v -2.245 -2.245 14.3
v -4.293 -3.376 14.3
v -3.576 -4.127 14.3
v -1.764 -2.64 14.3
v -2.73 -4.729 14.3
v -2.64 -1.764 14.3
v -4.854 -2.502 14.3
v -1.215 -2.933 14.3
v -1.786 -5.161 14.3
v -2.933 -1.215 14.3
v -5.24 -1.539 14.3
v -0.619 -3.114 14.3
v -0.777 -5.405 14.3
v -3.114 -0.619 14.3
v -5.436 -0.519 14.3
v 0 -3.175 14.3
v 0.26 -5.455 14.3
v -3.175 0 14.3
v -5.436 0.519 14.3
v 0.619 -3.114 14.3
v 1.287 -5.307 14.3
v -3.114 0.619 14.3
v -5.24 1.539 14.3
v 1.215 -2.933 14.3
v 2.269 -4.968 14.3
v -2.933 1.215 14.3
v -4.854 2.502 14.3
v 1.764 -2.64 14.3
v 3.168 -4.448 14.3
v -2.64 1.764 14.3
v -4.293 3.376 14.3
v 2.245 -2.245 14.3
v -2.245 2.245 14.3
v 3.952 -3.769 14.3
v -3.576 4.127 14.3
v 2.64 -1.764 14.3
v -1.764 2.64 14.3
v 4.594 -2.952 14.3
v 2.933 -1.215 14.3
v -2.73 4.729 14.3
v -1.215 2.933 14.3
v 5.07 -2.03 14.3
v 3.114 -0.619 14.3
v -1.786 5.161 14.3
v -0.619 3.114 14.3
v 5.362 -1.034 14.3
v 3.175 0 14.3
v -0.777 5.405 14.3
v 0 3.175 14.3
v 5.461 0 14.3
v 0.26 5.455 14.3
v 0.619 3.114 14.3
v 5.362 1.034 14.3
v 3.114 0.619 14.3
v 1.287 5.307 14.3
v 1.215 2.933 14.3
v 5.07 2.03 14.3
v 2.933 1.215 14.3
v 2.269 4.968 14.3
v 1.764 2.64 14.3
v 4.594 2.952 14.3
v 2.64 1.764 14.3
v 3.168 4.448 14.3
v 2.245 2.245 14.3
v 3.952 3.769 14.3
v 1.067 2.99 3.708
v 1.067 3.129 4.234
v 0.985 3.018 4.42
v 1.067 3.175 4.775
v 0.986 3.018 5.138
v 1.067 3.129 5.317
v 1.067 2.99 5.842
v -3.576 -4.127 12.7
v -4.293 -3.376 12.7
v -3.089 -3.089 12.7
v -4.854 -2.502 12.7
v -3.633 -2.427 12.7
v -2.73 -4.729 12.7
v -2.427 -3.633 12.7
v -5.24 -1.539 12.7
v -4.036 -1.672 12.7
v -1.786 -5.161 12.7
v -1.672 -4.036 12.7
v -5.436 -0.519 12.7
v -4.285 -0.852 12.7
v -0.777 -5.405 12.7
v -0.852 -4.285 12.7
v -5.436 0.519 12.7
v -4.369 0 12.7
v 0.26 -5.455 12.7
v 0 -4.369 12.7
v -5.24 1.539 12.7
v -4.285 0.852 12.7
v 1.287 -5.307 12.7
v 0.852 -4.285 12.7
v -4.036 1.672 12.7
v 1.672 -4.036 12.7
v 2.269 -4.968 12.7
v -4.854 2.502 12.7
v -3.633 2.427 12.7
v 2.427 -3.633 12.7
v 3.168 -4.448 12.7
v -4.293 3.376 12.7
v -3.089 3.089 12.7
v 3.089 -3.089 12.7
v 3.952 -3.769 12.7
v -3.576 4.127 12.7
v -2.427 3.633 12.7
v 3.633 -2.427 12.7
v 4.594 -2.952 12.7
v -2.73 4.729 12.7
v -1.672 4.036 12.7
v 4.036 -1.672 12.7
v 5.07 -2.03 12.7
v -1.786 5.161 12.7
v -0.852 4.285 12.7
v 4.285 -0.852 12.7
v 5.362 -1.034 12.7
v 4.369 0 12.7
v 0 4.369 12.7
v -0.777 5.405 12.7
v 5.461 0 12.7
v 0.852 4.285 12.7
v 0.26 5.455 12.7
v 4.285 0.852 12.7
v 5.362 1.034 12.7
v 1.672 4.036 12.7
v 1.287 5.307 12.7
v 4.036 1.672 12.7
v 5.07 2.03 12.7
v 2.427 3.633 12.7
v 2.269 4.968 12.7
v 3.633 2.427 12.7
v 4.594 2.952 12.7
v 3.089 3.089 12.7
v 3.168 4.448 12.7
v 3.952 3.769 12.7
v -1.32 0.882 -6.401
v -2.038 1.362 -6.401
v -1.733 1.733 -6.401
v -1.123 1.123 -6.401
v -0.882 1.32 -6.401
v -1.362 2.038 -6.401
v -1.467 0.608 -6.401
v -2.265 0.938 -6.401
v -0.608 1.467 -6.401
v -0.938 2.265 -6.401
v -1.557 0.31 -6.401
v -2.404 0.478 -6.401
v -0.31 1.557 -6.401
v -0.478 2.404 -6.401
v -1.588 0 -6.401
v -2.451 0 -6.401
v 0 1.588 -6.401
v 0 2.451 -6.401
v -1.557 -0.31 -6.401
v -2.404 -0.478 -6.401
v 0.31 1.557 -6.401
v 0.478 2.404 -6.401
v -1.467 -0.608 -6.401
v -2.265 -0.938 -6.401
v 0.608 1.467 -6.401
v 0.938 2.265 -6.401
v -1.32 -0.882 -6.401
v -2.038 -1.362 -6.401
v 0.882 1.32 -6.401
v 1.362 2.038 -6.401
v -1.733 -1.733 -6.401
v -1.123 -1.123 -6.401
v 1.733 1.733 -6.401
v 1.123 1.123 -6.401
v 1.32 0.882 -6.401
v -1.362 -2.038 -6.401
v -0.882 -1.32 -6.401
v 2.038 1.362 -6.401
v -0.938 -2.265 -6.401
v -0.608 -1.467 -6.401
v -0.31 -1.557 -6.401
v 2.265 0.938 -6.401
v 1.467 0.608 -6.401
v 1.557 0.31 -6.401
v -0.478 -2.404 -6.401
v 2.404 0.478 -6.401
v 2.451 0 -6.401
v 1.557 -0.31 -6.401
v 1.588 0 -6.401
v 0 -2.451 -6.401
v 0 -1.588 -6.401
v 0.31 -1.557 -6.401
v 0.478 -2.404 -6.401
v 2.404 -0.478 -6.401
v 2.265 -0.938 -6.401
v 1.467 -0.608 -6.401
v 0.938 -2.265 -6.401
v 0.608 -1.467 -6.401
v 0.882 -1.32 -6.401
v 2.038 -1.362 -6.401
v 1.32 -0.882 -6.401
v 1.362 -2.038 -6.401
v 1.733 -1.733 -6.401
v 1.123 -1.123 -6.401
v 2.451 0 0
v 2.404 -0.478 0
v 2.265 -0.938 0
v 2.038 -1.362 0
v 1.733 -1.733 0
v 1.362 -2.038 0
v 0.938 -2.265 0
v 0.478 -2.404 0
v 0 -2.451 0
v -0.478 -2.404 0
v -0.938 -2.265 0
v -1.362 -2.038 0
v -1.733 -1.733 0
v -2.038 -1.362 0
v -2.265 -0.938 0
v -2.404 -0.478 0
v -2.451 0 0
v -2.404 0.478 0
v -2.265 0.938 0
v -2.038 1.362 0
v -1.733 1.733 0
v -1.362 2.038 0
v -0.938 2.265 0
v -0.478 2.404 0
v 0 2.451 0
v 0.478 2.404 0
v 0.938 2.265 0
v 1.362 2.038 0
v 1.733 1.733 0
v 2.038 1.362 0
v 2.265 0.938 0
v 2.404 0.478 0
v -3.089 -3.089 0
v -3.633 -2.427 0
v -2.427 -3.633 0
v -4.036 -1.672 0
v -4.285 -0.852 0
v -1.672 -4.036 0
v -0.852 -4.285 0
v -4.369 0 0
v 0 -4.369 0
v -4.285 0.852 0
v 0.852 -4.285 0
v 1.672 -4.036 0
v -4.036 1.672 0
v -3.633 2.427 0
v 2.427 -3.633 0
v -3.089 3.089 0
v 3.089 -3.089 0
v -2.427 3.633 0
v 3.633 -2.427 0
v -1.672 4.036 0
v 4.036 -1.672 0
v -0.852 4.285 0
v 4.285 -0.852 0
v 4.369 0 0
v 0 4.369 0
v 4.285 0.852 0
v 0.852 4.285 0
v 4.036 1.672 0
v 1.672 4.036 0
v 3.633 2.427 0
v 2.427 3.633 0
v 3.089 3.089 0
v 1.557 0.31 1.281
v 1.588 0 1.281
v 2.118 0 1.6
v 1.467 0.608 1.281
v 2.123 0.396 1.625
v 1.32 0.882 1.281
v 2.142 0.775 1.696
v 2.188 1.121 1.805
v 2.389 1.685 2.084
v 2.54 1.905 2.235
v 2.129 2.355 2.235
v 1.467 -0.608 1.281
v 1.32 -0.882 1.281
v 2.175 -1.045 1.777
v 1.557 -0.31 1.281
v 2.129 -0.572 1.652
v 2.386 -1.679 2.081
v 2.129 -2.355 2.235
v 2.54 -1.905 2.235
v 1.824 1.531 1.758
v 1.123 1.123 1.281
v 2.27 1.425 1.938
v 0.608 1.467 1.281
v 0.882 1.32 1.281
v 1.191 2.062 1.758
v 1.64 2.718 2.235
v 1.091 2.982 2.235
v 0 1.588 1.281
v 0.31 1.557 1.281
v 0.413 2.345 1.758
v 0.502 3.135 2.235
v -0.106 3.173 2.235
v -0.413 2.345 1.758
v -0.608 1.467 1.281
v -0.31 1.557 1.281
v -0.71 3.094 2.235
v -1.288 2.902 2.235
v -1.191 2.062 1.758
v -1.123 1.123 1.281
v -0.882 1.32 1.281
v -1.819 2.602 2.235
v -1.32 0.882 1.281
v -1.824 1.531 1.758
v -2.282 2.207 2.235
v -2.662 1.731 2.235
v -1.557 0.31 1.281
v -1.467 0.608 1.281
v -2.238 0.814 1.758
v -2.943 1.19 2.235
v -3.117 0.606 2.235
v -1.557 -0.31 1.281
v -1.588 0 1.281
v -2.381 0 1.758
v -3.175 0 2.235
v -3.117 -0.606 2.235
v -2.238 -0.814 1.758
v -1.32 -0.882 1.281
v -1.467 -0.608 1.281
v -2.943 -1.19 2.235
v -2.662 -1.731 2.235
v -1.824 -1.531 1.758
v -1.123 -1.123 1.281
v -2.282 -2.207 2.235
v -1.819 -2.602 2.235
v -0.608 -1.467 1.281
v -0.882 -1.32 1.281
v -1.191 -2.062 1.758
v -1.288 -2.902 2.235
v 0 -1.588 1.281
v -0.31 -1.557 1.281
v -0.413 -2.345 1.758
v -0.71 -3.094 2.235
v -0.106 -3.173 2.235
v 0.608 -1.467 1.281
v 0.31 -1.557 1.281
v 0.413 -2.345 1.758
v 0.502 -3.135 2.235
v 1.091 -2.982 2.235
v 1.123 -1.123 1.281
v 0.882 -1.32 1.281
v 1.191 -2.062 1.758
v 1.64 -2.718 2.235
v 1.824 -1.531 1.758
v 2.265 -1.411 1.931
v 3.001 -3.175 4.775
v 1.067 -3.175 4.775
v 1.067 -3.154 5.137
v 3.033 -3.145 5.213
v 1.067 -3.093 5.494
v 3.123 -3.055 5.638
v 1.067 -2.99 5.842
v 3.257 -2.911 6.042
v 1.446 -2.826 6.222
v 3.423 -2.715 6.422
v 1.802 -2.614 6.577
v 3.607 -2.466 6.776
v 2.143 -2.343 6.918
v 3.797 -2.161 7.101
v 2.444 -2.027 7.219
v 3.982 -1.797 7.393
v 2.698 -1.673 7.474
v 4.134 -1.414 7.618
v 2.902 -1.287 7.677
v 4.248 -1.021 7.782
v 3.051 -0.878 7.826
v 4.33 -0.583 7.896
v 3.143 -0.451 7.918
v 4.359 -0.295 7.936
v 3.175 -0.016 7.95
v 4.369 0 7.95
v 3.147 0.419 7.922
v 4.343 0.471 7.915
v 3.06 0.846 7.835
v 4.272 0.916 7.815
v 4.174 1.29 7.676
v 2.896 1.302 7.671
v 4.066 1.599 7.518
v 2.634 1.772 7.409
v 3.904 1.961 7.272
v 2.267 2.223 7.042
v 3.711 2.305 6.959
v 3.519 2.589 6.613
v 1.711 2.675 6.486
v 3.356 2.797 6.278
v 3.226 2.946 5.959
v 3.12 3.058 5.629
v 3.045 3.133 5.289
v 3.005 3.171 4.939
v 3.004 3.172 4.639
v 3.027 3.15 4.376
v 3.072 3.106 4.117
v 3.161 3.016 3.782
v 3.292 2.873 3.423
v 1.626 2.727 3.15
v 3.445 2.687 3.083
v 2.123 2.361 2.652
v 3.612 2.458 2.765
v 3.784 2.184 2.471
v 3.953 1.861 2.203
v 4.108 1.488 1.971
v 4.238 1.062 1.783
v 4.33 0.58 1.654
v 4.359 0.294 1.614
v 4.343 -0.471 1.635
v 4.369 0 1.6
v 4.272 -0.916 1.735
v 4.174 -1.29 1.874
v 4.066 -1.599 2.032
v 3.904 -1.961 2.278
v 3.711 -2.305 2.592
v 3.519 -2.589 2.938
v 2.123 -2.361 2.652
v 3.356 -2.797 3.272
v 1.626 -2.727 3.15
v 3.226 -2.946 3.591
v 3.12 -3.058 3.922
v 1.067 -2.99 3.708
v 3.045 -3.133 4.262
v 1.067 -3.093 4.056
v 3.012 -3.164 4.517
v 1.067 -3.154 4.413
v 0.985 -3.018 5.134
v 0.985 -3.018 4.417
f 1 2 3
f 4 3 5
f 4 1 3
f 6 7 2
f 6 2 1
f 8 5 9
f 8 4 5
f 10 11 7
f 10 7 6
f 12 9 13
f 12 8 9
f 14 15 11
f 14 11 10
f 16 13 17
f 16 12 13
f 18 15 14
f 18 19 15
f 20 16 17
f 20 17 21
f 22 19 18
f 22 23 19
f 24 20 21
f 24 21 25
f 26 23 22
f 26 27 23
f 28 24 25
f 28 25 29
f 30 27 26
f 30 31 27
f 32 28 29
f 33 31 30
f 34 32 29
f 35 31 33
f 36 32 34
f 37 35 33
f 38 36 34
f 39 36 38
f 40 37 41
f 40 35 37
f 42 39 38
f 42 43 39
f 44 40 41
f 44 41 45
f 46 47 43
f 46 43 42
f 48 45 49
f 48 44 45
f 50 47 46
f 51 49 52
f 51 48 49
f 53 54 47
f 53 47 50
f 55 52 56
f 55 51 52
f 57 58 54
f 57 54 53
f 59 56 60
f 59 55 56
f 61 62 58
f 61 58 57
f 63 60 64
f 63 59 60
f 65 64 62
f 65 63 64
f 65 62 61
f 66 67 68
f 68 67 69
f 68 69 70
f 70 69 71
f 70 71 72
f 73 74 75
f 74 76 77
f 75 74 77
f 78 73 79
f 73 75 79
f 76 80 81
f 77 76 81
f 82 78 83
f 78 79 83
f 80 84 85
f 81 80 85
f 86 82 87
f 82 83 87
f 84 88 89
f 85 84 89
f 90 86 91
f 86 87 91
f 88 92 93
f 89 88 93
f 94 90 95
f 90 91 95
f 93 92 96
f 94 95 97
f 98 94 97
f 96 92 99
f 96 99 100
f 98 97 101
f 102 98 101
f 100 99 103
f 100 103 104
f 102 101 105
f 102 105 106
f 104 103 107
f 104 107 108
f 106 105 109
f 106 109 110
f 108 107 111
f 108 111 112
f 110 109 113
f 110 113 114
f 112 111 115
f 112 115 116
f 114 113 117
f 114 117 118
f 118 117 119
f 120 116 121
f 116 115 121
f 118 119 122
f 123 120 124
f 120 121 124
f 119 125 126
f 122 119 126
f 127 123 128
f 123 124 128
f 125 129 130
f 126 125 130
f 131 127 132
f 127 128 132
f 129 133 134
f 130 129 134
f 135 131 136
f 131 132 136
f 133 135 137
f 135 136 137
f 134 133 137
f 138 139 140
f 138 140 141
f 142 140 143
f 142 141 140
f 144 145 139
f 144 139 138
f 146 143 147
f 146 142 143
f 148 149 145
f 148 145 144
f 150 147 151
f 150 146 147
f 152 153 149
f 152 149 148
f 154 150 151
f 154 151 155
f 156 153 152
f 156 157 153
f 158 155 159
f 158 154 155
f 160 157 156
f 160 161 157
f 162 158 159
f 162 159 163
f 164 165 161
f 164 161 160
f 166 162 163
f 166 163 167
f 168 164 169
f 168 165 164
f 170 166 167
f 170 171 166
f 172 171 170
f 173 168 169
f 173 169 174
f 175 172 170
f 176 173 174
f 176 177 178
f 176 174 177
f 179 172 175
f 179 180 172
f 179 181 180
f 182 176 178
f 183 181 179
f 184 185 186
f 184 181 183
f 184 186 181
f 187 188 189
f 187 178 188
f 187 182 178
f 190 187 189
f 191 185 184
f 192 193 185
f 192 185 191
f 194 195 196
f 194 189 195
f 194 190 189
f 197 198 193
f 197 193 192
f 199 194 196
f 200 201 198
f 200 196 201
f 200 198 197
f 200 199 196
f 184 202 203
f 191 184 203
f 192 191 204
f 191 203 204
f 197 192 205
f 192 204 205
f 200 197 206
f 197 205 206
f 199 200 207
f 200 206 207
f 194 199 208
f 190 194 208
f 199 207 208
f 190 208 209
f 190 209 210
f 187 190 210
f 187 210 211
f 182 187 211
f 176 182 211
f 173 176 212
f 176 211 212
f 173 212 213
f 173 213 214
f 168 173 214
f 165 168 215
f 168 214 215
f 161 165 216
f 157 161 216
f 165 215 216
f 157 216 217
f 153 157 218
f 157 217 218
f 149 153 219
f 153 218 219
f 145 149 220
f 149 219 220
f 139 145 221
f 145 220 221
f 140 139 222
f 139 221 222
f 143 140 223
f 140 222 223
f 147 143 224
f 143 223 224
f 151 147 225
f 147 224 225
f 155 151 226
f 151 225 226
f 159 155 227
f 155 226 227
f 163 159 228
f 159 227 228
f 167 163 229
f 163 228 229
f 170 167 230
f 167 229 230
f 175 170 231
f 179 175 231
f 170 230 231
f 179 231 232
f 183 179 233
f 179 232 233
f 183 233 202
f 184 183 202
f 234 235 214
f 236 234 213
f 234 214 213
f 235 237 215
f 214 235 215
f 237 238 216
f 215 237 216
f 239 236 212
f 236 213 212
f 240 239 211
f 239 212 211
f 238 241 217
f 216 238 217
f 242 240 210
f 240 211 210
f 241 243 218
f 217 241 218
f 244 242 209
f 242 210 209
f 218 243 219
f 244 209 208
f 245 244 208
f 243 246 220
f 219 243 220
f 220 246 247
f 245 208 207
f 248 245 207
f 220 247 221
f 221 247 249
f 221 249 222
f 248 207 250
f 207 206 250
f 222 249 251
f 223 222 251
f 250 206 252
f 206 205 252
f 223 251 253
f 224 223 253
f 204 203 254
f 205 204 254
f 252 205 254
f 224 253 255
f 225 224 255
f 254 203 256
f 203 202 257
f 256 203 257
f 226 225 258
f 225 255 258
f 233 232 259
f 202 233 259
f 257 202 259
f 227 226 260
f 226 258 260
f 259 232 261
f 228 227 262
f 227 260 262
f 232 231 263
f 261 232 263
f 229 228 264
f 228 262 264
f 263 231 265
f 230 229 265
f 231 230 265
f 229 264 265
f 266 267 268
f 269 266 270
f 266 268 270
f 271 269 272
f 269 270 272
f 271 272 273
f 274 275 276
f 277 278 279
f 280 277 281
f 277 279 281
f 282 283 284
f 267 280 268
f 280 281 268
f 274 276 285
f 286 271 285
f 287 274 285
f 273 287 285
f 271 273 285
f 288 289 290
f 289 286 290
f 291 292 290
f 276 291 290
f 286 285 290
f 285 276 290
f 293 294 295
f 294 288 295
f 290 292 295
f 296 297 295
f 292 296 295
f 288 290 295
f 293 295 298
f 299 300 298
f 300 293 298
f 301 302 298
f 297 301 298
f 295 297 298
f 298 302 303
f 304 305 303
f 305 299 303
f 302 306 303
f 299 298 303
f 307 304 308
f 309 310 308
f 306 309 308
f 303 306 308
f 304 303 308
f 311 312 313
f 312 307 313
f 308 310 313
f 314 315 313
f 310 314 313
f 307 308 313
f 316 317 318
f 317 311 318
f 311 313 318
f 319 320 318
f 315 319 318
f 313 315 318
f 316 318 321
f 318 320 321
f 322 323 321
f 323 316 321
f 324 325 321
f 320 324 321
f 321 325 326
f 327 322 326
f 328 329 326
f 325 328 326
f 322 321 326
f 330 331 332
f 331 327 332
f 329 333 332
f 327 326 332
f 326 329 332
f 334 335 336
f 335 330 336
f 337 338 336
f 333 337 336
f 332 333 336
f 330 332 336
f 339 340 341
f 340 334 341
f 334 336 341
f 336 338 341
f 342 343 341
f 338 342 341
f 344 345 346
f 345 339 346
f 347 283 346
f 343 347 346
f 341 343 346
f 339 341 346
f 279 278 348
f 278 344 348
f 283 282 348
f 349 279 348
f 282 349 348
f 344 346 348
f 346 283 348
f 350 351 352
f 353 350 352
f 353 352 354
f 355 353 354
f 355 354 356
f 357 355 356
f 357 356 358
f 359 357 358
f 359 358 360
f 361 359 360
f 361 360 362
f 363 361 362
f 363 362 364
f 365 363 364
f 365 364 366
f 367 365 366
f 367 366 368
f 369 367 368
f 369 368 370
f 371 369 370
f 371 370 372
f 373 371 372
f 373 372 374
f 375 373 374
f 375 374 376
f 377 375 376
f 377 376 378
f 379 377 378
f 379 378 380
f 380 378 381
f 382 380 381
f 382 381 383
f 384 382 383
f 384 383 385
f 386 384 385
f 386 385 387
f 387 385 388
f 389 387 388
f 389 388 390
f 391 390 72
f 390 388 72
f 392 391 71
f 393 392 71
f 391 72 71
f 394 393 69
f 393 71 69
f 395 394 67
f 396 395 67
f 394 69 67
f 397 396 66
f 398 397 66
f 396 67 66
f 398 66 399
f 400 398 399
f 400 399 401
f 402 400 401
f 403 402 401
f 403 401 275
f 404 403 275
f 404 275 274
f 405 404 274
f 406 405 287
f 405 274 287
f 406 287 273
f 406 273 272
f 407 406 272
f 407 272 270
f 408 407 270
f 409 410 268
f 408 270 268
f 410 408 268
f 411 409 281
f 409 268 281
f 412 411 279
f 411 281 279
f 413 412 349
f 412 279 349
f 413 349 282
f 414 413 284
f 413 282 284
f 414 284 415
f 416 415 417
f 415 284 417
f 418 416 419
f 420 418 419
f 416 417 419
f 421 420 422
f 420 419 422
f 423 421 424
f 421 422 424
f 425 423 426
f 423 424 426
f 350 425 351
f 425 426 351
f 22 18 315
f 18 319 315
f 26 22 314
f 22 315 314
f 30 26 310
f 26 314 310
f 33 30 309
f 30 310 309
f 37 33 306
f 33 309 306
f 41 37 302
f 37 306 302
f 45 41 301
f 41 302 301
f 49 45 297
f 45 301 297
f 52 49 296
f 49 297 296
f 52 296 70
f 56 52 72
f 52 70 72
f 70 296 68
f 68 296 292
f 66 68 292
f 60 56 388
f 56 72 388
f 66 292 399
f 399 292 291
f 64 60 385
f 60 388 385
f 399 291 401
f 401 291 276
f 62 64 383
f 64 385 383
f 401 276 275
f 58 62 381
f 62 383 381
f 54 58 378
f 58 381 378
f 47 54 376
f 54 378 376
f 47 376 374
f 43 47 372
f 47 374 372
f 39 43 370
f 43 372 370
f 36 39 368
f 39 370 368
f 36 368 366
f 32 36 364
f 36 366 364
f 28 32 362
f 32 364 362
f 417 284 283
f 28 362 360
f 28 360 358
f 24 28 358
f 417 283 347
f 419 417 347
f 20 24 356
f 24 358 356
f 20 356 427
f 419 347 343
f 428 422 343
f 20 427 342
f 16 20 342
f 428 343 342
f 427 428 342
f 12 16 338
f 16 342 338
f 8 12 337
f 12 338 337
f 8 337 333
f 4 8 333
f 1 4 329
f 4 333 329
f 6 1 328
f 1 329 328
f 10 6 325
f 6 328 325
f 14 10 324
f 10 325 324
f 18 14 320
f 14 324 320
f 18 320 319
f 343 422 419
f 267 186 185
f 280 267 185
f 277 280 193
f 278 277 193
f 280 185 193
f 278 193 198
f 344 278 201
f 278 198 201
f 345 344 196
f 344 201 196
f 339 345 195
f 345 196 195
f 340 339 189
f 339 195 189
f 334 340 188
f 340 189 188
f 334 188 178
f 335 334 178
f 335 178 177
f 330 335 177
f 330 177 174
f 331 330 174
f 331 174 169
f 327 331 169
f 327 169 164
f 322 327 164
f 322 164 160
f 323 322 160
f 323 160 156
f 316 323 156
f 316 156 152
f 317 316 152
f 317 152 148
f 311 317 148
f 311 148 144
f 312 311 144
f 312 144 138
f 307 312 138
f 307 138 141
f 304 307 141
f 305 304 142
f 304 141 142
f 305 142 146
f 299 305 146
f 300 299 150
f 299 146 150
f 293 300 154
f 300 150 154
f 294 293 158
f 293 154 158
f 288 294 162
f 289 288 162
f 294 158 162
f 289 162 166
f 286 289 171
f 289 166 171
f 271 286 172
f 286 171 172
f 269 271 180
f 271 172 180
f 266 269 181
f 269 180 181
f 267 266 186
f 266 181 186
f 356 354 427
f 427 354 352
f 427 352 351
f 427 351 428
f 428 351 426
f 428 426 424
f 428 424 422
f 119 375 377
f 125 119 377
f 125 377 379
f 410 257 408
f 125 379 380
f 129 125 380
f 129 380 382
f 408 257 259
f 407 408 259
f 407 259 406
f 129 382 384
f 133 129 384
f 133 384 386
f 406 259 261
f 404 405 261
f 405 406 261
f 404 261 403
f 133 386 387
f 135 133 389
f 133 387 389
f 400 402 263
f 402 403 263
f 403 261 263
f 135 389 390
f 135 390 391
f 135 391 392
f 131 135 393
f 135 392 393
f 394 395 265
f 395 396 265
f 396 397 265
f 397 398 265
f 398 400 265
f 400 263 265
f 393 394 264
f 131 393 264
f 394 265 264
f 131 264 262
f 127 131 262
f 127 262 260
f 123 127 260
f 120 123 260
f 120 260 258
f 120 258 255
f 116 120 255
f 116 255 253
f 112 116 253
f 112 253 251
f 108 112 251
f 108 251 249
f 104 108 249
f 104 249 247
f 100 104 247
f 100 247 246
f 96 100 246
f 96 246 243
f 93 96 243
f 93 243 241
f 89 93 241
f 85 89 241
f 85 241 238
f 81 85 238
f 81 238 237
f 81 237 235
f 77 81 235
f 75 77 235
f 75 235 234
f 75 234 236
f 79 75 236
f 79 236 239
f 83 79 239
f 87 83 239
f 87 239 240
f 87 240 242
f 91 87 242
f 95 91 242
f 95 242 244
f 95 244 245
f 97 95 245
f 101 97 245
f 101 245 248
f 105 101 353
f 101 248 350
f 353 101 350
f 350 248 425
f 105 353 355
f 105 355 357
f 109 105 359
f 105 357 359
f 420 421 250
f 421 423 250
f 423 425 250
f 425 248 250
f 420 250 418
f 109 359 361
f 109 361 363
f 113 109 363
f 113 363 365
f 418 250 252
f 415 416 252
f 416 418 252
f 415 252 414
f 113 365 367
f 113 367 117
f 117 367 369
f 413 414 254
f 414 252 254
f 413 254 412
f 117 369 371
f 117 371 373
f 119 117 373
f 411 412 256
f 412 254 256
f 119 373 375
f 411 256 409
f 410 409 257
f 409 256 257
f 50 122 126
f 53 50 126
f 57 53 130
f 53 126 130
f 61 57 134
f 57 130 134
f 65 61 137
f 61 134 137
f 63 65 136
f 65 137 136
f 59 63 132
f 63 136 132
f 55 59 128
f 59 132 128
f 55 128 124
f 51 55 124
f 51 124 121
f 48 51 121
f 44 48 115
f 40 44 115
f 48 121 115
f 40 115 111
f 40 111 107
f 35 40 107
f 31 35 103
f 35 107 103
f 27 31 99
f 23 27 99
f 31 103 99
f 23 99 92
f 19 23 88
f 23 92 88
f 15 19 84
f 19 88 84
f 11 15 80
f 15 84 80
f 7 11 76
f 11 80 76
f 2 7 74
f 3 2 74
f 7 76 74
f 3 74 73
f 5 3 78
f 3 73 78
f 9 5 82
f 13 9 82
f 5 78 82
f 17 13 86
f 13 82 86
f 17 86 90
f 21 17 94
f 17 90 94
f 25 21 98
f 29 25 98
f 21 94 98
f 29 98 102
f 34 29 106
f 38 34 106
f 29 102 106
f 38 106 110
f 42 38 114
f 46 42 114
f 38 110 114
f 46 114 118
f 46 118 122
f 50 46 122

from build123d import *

# Parameters (mm, degrees)
F0_R      = 4.3688
F1_DEPTH  = 12.7
F2_R      = 5.461
F2_R_2    = 4.3688
F3_DEPTH  = 1.6002
F5_D      = 6.35
F5_DEPTH  = 12.065
F5_TIP    = 1.9077324654
F6_R      = 2.4511
F7_DEPTH  = 6.4008
F8_R      = 1.5875
F9_DEPTH  = 20.702
F12_D     = 6.35
F12_DEPTH = 3.302
F12_TIP   = 1.9077324654


with BuildPart() as f1:
    # F0 (on Top) → F1 (new body)
    with BuildSketch(Plane.XY):
        Circle(F0_R)
    extrude(amount=F1_DEPTH)

    # F2 (on face) → F3 (join)
    with BuildSketch(Plane.XY.offset(12.7)):
        Circle(F2_R)
        Circle(F2_R_2, mode=Mode.SUBTRACT)
        Circle(F2_R_2)
    extrude(amount=F3_DEPTH)

    # F5
    with Locations(Plane.XY.offset(14.3002)):
        with Locations((0, 0)):
            Hole(F5_D / 2, depth=F5_DEPTH)
            with Locations((0, 0, -(F5_DEPTH + F5_TIP / 2))):  # 118° drill point
                Cone(0, F5_D / 2, F5_TIP, mode=Mode.SUBTRACT)

    # F6 (on face) → F7 (join)
    with BuildSketch(Plane(origin=(0, 0, 0), x_dir=(1, 0, 0), z_dir=(0, 0, -1))):
        Circle(F6_R)
    extrude(amount=F7_DEPTH)

    # F8 (on face) → F9 (cut, through all)
    with BuildSketch(Plane(origin=(0, 0, -6.4008), x_dir=(1, 0, 0), z_dir=(0, 0, -1))):
        Circle(F8_R)
    extrude(amount=-F9_DEPTH, mode=Mode.SUBTRACT)

    # F12
    with Locations(Plane.YZ.offset(4.3688)):
        with Locations((0, 4.7752)):
            Hole(F12_D / 2, depth=F12_DEPTH)
            with Locations((0, 0, -(F12_DEPTH + F12_TIP / 2))):  # 118° drill point
                Cone(0, F12_D / 2, F12_TIP, mode=Mode.SUBTRACT)


solid = f1.part
